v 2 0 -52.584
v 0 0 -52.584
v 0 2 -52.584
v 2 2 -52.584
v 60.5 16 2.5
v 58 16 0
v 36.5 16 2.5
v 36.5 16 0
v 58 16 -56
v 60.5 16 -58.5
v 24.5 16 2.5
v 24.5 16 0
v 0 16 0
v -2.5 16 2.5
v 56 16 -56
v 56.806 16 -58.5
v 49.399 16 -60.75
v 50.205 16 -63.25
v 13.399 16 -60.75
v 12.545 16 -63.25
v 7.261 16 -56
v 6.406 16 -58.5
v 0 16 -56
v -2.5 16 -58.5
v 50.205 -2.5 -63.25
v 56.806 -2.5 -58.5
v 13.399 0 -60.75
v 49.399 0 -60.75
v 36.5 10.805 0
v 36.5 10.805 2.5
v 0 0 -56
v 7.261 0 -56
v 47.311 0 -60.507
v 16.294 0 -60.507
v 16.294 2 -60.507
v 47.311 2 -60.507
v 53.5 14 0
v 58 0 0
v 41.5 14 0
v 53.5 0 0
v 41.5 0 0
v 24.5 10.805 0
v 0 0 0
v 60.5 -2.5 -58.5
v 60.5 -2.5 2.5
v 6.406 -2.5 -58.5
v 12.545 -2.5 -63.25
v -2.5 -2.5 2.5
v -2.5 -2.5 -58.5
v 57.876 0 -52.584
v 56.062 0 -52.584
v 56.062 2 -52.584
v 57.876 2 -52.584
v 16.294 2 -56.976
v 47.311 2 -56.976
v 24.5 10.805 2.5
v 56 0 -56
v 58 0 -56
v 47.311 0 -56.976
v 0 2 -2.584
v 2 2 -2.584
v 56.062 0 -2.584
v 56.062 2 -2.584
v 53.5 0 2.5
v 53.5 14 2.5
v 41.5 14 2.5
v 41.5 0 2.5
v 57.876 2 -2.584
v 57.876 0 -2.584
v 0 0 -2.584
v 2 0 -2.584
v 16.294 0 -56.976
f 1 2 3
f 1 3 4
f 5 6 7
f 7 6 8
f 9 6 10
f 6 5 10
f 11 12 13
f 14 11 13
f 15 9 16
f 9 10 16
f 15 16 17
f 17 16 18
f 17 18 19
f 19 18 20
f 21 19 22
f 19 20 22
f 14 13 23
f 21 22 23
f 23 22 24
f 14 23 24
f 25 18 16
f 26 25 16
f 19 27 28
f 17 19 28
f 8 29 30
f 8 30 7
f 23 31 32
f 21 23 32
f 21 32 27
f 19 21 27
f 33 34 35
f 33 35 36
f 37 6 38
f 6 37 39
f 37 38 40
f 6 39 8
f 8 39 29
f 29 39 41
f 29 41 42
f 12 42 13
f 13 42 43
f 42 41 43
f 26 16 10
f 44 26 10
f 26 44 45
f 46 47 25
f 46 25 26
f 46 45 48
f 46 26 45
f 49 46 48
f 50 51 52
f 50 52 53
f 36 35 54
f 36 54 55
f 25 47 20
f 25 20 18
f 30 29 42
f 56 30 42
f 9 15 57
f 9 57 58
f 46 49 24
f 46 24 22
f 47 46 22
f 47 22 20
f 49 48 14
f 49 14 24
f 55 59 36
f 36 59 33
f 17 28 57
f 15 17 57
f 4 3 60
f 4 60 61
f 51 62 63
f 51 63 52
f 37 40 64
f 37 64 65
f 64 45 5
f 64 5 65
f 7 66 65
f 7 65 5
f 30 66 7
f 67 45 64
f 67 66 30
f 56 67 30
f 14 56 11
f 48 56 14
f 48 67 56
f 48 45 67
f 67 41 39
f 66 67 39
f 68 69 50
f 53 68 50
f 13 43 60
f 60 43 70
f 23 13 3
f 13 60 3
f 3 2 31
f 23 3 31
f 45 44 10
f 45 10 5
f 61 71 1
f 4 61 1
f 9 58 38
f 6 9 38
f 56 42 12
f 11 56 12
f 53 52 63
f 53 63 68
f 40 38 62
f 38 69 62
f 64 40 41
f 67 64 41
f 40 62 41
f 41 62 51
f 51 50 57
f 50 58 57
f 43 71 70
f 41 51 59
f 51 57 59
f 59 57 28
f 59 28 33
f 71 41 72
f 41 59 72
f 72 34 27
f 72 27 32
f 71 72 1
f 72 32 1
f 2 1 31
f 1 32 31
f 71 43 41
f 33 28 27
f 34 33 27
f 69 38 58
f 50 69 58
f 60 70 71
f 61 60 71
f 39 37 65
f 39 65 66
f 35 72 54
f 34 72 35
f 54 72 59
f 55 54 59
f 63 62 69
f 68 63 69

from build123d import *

# Parameters (mm, degrees)
BOSS_EXTRUDE1_DEPTH = 16
SHELL1_T            = 2.5
SKETCH2_W           = 12
SKETCH2_H           = 14
SKETCH2_H_2         = 5.195244662
CUT_EXTRUDE1_DEPTH  = 4
SKETCH3_W           = 2
SKETCH3_H           = 50
SKETCH3_W_2         = 1.814522713
BOSS_EXTRUDE2_DEPTH = 2
SKETCH4_W           = 31.017616101
SKETCH4_H           = 3.530460369
BOSS_EXTRUDE3_DEPTH = 2


with BuildPart() as part:
    # Sketch1 → Boss-Extrude1 (new body)
    with BuildSketch(Plane(origin=(0, 0, 0), x_dir=(1, 0, 0), z_dir=(0, 1, 0))):
        Polygon((0, 0), (0, 56), (7.260584432, 56), (13.399361706, 60.750217247), (49.399361706, 60.750217247), (56, 56), (58, 56), (58, 0), align=None)
    extrude(amount=BOSS_EXTRUDE1_DEPTH)

    # Shell1
    shell1_openings = [part.faces().sort_by_distance(p)[0] for p in [
        (29.147078279, 16, -29.765448683),
    ]]
    offset(amount=SHELL1_T, openings=shell1_openings, kind=Kind.INTERSECTION)

    # Sketch2 → Cut-Extrude1 (cut)
    with BuildSketch(Plane(origin=(0, 0, 0), x_dir=(-1, 0, 0), z_dir=(0, 0, -1))):
        with Locations((-47.5, 7)):
            Rectangle(SKETCH2_W, SKETCH2_H)
        with Locations((-30.5, 13.402377669)):
            Rectangle(SKETCH2_W, SKETCH2_H_2)
    extrude(amount=-CUT_EXTRUDE1_DEPTH, mode=Mode.SUBTRACT)

    # Sketch3 → Boss-Extrude2 (add)
    with BuildSketch(Plane(origin=(0, 0, 0), x_dir=(1, 0, 0), z_dir=(0, 1, 0))):
        with Locations((1, 27.58353092)):
            Rectangle(SKETCH3_W, SKETCH3_H)
        with Locations((56.968981121, 27.58353092)):
            Rectangle(SKETCH3_W_2, SKETCH3_H)
    extrude(amount=BOSS_EXTRUDE2_DEPTH)

    # Sketch4 → Boss-Extrude3 (add)
    with BuildSketch(Plane(origin=(0, 0, 0), x_dir=(1, 0, 0), z_dir=(0, 1, 0))):
        with Locations((31.80262956, 58.741489624)):
            Rectangle(SKETCH4_W, SKETCH4_H)
    extrude(amount=BOSS_EXTRUDE3_DEPTH)


solid = part.part
